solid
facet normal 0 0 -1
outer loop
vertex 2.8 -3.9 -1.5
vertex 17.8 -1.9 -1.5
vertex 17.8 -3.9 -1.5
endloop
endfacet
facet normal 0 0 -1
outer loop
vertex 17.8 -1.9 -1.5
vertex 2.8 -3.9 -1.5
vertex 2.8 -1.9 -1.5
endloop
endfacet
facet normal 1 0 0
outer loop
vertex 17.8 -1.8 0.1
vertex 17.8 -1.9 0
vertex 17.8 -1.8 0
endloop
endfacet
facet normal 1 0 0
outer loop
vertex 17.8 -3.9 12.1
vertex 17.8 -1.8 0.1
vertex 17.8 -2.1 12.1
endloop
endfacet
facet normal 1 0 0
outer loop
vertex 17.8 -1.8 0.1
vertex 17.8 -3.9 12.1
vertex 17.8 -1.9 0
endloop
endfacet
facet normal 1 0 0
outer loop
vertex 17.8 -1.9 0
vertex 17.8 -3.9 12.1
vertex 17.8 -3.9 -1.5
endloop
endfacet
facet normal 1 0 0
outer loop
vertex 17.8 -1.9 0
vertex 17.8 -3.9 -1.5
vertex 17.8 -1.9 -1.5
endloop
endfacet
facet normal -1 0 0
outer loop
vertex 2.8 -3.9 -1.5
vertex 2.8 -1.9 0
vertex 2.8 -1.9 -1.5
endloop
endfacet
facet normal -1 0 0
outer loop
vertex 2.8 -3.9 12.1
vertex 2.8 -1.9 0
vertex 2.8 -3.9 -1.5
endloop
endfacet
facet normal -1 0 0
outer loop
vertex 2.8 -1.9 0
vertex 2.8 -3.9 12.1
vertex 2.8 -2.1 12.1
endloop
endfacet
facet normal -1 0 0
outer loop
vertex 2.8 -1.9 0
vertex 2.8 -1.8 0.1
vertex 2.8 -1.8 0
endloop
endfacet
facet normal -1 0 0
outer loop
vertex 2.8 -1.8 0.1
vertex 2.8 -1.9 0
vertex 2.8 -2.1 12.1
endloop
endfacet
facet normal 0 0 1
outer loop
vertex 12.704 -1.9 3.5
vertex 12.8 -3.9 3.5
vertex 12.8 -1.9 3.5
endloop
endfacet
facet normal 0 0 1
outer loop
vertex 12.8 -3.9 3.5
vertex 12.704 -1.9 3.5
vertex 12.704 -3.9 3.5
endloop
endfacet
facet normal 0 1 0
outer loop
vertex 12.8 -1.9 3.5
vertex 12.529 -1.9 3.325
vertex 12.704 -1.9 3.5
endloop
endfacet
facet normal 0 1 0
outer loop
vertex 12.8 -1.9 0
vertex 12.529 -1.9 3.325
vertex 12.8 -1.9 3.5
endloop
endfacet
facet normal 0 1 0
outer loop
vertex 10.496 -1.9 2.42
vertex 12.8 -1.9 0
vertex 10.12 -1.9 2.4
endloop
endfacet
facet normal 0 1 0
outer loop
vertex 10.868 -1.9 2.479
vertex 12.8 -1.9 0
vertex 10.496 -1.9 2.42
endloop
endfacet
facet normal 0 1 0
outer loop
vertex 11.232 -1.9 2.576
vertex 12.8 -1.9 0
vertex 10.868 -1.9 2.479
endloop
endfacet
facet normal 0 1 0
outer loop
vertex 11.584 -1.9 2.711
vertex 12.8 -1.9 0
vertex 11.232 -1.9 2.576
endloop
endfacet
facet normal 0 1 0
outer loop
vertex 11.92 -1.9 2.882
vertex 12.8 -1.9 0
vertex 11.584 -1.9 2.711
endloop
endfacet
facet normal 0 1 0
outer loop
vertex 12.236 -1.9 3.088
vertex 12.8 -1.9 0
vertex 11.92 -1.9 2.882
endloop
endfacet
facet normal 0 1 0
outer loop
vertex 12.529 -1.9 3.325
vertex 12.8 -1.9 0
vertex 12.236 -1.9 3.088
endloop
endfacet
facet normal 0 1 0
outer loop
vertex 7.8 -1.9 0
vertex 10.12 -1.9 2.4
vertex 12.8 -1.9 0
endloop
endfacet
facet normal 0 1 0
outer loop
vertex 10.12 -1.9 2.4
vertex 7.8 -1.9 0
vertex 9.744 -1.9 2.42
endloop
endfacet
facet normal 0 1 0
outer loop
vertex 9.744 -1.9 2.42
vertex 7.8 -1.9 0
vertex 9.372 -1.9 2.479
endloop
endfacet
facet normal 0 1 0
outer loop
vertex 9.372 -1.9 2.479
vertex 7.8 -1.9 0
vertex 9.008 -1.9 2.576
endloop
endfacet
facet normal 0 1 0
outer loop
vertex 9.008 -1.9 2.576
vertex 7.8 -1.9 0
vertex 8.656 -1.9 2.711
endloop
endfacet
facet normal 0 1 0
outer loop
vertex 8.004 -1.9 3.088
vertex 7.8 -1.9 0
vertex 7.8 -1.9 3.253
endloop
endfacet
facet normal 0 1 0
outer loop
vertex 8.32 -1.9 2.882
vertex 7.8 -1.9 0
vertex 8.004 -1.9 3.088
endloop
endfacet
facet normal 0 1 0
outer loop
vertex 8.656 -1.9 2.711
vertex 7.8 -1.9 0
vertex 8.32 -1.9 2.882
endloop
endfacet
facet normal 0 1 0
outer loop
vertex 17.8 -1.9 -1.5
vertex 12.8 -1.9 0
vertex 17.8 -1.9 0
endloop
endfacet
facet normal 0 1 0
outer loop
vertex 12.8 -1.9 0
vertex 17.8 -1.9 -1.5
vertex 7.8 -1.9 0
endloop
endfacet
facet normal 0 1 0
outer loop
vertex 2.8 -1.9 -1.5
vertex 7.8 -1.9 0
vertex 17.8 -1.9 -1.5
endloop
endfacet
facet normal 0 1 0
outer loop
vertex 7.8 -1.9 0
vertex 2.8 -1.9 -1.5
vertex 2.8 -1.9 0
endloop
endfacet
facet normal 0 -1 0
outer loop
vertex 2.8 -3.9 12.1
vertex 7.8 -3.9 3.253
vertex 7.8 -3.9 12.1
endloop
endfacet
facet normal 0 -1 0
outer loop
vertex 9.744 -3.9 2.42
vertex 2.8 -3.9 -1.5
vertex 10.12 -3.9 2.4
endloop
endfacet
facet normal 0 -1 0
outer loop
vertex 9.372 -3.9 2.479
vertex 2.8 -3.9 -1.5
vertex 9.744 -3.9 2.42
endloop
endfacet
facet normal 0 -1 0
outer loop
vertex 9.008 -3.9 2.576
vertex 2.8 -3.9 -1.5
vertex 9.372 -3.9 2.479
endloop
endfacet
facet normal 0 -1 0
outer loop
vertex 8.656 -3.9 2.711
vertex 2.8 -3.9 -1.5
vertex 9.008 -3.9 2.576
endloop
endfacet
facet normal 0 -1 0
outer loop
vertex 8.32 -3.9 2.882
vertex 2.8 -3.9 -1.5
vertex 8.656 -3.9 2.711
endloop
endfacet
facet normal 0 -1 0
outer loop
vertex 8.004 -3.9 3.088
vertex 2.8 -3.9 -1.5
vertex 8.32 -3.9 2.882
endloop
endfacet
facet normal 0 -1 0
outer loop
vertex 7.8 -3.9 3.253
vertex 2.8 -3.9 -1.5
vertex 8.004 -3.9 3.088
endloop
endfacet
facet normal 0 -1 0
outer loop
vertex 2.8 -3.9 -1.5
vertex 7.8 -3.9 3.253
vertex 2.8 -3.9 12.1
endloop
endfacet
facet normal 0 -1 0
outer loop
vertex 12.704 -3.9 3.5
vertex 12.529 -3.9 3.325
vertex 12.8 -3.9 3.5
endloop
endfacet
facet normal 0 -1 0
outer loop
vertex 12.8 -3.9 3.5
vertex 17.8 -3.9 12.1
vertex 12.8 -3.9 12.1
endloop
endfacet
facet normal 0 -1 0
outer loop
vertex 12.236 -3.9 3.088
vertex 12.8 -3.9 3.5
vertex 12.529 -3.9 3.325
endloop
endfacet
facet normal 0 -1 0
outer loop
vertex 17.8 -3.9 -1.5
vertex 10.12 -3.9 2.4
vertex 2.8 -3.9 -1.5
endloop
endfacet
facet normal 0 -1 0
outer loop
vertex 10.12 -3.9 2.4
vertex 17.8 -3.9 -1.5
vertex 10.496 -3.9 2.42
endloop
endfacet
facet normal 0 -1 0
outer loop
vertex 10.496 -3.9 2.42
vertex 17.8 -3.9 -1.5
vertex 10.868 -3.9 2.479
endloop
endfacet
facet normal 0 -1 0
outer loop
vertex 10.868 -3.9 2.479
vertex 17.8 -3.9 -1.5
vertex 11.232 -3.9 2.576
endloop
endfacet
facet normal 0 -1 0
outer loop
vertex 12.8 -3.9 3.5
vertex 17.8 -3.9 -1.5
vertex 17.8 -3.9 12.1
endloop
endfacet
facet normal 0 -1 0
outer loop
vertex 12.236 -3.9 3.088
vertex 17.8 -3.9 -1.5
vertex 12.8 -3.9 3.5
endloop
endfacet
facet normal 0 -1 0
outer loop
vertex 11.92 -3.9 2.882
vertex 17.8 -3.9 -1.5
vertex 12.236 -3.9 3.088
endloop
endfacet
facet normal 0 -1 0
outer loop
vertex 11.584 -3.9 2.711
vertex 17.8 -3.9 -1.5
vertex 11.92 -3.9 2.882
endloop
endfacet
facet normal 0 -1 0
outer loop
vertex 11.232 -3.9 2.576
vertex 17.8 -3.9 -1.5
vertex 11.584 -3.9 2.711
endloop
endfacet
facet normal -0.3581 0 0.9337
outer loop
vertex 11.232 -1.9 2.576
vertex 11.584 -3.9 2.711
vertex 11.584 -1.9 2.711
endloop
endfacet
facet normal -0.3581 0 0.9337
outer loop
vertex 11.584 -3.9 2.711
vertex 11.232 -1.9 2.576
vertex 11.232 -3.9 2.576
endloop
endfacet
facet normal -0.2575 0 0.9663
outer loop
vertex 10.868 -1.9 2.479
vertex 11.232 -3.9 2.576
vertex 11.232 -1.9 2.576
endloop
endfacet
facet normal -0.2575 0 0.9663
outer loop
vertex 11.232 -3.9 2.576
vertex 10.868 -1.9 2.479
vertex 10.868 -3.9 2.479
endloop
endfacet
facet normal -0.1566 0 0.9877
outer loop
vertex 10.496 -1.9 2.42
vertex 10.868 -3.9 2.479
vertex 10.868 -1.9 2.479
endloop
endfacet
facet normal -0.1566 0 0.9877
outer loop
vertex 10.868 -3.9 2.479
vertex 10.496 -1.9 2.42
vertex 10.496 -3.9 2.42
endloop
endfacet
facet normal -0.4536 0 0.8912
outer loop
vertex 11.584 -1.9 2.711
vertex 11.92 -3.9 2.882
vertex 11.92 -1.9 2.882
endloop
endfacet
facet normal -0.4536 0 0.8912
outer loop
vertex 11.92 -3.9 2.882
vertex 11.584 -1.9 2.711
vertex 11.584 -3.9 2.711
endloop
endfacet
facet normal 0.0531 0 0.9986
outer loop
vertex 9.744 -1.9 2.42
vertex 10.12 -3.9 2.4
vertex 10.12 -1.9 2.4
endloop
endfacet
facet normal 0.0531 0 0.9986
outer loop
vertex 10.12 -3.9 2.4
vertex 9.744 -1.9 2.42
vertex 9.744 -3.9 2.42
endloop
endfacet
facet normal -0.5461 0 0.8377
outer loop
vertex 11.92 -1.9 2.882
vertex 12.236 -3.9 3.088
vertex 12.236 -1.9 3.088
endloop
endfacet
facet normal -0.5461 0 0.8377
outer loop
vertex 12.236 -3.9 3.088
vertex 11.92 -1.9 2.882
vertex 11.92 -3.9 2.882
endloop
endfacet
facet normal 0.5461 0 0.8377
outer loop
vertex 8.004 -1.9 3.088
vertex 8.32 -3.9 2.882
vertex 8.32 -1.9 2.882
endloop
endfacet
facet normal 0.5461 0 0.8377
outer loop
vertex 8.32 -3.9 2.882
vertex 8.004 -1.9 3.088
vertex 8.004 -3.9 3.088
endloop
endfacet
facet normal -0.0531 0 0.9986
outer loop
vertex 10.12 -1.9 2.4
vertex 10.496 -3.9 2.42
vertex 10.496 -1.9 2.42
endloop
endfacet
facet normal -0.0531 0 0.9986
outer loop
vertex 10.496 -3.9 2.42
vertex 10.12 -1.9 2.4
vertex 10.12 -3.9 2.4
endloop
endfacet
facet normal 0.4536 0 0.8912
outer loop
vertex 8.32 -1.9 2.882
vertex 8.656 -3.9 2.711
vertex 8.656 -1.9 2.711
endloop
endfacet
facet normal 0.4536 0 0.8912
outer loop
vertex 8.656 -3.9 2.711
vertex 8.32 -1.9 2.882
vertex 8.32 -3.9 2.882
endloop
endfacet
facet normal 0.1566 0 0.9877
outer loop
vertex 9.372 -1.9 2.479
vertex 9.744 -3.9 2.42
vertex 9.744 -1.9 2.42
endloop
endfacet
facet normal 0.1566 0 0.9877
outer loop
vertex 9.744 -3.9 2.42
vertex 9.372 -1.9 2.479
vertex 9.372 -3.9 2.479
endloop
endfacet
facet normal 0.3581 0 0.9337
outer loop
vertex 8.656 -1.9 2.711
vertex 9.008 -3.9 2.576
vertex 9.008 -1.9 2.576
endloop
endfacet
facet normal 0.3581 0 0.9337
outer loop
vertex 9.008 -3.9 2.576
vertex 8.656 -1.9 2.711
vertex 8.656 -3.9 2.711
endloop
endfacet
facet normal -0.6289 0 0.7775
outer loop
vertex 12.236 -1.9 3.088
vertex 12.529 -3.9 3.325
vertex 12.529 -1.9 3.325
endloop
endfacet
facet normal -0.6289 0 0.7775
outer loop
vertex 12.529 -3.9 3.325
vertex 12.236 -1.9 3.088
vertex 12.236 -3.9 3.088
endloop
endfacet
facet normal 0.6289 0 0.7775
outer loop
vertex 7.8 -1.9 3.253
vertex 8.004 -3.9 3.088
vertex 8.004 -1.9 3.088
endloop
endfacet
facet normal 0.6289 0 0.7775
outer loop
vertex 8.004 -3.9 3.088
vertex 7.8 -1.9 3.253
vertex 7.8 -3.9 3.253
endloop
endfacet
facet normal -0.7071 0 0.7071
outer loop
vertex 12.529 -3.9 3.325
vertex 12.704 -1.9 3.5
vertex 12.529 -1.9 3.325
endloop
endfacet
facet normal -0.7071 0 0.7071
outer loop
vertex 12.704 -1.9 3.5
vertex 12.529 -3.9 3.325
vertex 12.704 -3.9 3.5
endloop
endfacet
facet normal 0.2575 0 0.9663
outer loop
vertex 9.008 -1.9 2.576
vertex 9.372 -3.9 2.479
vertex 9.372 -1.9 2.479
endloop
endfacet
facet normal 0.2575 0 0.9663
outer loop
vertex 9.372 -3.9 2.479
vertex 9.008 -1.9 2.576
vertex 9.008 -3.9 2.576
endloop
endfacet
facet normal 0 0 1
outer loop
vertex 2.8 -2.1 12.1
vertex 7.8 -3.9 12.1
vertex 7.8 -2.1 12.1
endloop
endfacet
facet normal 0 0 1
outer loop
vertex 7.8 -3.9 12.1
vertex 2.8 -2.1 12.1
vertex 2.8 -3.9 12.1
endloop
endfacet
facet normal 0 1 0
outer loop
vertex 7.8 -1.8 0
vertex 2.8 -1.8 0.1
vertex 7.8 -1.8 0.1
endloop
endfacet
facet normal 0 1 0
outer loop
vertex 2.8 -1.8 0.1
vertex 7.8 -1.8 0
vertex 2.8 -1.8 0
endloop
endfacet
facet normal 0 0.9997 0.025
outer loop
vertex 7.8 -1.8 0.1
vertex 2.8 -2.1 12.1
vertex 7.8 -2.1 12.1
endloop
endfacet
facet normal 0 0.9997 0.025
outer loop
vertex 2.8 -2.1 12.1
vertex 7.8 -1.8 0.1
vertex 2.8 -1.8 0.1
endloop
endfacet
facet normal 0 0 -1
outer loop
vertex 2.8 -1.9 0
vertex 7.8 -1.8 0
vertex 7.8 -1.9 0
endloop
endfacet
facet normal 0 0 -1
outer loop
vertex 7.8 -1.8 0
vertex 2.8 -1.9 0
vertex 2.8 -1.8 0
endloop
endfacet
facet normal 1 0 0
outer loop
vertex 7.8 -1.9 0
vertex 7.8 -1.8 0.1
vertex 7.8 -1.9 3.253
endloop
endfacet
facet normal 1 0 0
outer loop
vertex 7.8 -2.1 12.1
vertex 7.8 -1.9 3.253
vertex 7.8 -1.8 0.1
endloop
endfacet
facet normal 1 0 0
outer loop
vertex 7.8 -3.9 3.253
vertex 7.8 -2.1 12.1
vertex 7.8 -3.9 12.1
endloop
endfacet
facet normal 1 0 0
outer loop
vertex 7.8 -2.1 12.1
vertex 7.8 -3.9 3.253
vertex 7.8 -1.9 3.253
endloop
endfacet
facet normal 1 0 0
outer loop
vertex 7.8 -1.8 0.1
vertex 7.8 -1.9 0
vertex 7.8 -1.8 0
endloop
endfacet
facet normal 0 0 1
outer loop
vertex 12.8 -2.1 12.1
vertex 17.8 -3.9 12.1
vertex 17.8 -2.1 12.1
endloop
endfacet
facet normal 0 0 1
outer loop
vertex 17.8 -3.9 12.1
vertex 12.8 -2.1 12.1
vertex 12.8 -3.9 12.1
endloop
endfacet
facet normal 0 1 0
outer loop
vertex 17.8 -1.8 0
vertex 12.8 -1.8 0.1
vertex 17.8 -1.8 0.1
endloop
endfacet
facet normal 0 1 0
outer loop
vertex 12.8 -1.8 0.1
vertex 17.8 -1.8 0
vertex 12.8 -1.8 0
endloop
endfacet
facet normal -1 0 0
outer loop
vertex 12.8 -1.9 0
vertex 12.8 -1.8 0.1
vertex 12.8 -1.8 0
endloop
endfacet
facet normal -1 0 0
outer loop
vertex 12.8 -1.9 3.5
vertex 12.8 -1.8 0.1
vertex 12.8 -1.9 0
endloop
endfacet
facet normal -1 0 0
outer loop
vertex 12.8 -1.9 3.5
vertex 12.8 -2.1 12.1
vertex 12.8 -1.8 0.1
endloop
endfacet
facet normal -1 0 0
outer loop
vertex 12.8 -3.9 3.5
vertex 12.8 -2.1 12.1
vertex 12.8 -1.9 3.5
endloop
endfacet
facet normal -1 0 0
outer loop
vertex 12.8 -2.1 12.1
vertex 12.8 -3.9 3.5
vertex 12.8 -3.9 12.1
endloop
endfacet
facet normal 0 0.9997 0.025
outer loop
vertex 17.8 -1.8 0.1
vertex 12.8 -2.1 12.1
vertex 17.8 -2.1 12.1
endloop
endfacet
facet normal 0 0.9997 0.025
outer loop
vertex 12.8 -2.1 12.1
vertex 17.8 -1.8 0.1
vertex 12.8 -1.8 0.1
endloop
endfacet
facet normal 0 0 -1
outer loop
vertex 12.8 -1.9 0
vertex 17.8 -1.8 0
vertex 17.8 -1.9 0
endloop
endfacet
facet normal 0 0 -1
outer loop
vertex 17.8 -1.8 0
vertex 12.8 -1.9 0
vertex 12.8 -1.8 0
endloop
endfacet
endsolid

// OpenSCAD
echo(version=version());
//include <threads.scad>


// Base Config
base_W = 120; // Min Size < 10
base_H = 40; // Min Size < 40
base_T = 0.5; // Fix Size = 0.5 for Stapler
default_S = 12; // Fix Size = 12 for Stapler (Stapler size)
default_T = 3.0; // Fix Size = 2.0 for Stapler (base_T < default_T)
$fn = 60;
minkowski_R = 2;
outR=14;
pitchN=4;
interR=9;
bladehuckR=0;

// * difference(){
//     import("2020 alu section.STL", convexity=3);
//     translate([-5, -5, 10]) cube([30, 30, 500]);
// }

*difference(){
    union() {
        translate([7.2, 0, 0]) cube([5.8, 3, 12]);
        hull() {
            translate([5, 2, 0]) cube([10, 1.5, 12]);
            translate([7.4, 5.5, 0]) cube([5.3, 0.1, 12]);
        }
        translate([10.12, 0, 6]) rotate([90, 0, 0]) cylinder(h=10, r=3.6, center=false);
    }
    // translate([10, 8, 5]) rotate([90, 0, 0]) cylinder(h=10, r=2, center=false);
    // translate([10, 8, 15]) rotate([90, 0, 0]) cylinder(h=10, r=2, center=false);
    translate([3, -4, 0]) cube([5, 2, 12]);
    translate([12, -4, 0]) cube([5, 2, 12]);
    // *translate([87.5, 60, -19]) rotate([0, 0, 180]) import("M3x15x0.5 Philips Pan Head Screw.stl", convexity=3);
    // *translate([87.5, 60, -9]) rotate([0, 0, 180]) import("M3x15x0.5 Philips Pan Head Screw.stl", convexity=3);
    // *translate([87.5, 60, 1]) rotate([0, 0, 180]) import("M3x15x0.5 Philips Pan Head Screw.stl", convexity=3);
}


union() {
    hull() {
        translate([2.8, -3.9, 12]) cube([5, 1.8, 0.1]);
        translate([2.8, -3.9, 0]) cube([5, 2.1, 0.1]);
    }
    hull() {
        translate([12.8, -3.9, 12]) cube([5, 1.8, 0.1]);
        translate([12.8, -3.9, 0]) cube([5, 2.1, 0.1]);
    }
    difference(){
        translate([2.8, -3.9, 3.5]) rotate([0, 90, 0]) cube([5, 2, 15]);
        translate([10.12, 0, 6]) rotate([90, 0, 0]) cylinder(h=10, r=3.6, center=false);
    }
}

// translate([2, 2, 2]) {
//     // main body
//     *union() {
//         difference(){
//             union() {
//                 intersection() {
//                     union() {
//                             translate([0, 30.25, -7.75]) cube([18.75, 4.75, 17.75]);
//                             translate([0, 8, -7.75]) cube([8.5, 23, 7.5]);
//                             translate([10.25, 8, 2.5]) cube([8.5, 23, 7.5]);
//                     }
//                     translate([9.5, 36, 1.25]) rotate([90, 0, 0]) cylinder(h=30, r=interR, center=false);
//                 }
//                 // body screw
//                 translate([9.5, 35, 1.25]) rotate([90, 0, 0]) metric_thread (diameter=23, pitch=pitchN, length=13);
//             }
//             translate([-9.7, 8, -0.3]) cube([20, 22, 20]);
//             translate([8.5, 8, -17.5]) cube([20, 22, 20]);
//         }
//         // body
//         difference(){
//                 translate([9.5, 65, 1.25]) rotate([90, 0, 0]) cylinder(h=33, r=outR, center=false);
//                 translate([9.5, 65, 1.25]) rotate([90, 0, 0]) metric_thread (diameter=24, pitch=pitchN, length=10, internal=true);
//                 translate([9.5, 65, 1.25]) rotate([90, 0, 0]) cylinder(h=29, r=10.5, center=false);
//         }
//         // body plate
//         translate([-2.5, 33, 0]) cube([24, 21.8, 2]);
//         // suport parts
//         * translate([-0.5, 54.8, 1]) {
//             hull() {
//                 translate([0, 5.2, 1]) cube([20, 5, 0.1]);
//                 translate([0, 0, 0]) cube([20, 10.2, 0.1]);
//                 translate([0, 5.2, -1]) cube([20, 5, 0.1]);
//             }
//         }
//     }
//     // blade holder
//     *difference(){
//         union() {
//             intersection() {
//                 union() {
//                     union() {
//                         translate([0, 8, 0]) difference(){
//                             cube([10, 22, 10]);
//                             translate([8.8, 0, 0]) cube([5, 11.5, 11]);
//                             translate([0, 0, 0]) cube([11, 11.5, 1.2]);
//                         }
//                         translate([5, 11, 5.5]) rotate([0, 90, 0]) cylinder(h=5, r=1.4, center=false, $fn=20);
//                         translate([4.5, 11, 0]) rotate([0, 0, 0]) cylinder(h=5, r=1.4, center=false, $fn=20);
//                     }
//                     translate([8.7, 0, -7.7]) rotate([0, 90, 0]) mirror([1,0,0]) union() {
//                         translate([0, 8, 0]) difference(){
//                             cube([10, 22, 10]);
//                             translate([8.8, 0, 0]) cube([5, 11.5, 11]);
//                             translate([0, 0, 0]) cube([11, 11.5, 1.2]);
//                         }
//                         translate([5, 11, 5.5]) rotate([0, 90, 0]) cylinder(h=5, r=1.4, center=false, $fn=20);
//                         translate([4.5, 11, 0]) rotate([0, 0, 0]) cylinder(h=5, r=1.4, center=false, $fn=20);
//                     }
//                 }
//                 translate([9.5, 36, 1.25]) rotate([90, 0, 0]) cylinder(h=30, r=interR, center=false);
//             }
//             // body screw
//             translate([9.5, 35, 1.25]) rotate([90, 0, 0]) metric_thread (diameter=23, pitch=pitchN, length=13);
//         }
//         translate([10, 8, 2.3]) cube([20, 22, 20]);
//         translate([-11.2, 8, -20]) cube([20, 22, 20]);
//         translate([-5, 30, -15]) cube([30, 10, 30]);
//     }

//     // cap
//     *union() {
//         translate([9.5, 85, 1.25]) rotate([90, 0, 0]) cylinder(h=8, r=outR, center=false);
//         translate([9.5, 80, 1.25]) rotate([90, 0, 0]) metric_thread (diameter=23, pitch=pitchN, length=9.5);
//     }

//     // main cap
//     *difference(){
//         translate([9.5, 0, 1.25]) rotate([90, 0, 0]) cylinder(h=43, r=outR, center=false);
//         translate([9.5, 5, 1.25]) rotate([90, 0, 0]) metric_thread (diameter=24, pitch=pitchN, length=45, internal=true);
//     }

//     // stopper ring
//     *difference(){
//         translate([9.5, 0, 1.25]) rotate([90, 0, 0]) cylinder(h=43, r=outR, center=false);
//         translate([9.5, 5, 1.25]) rotate([90, 0, 0]) metric_thread (diameter=24.3, pitch=pitchN, length=45, internal=true);
//         translate([-10, -45, -20]) cube([40, 40, 40]);
//     }



// }
